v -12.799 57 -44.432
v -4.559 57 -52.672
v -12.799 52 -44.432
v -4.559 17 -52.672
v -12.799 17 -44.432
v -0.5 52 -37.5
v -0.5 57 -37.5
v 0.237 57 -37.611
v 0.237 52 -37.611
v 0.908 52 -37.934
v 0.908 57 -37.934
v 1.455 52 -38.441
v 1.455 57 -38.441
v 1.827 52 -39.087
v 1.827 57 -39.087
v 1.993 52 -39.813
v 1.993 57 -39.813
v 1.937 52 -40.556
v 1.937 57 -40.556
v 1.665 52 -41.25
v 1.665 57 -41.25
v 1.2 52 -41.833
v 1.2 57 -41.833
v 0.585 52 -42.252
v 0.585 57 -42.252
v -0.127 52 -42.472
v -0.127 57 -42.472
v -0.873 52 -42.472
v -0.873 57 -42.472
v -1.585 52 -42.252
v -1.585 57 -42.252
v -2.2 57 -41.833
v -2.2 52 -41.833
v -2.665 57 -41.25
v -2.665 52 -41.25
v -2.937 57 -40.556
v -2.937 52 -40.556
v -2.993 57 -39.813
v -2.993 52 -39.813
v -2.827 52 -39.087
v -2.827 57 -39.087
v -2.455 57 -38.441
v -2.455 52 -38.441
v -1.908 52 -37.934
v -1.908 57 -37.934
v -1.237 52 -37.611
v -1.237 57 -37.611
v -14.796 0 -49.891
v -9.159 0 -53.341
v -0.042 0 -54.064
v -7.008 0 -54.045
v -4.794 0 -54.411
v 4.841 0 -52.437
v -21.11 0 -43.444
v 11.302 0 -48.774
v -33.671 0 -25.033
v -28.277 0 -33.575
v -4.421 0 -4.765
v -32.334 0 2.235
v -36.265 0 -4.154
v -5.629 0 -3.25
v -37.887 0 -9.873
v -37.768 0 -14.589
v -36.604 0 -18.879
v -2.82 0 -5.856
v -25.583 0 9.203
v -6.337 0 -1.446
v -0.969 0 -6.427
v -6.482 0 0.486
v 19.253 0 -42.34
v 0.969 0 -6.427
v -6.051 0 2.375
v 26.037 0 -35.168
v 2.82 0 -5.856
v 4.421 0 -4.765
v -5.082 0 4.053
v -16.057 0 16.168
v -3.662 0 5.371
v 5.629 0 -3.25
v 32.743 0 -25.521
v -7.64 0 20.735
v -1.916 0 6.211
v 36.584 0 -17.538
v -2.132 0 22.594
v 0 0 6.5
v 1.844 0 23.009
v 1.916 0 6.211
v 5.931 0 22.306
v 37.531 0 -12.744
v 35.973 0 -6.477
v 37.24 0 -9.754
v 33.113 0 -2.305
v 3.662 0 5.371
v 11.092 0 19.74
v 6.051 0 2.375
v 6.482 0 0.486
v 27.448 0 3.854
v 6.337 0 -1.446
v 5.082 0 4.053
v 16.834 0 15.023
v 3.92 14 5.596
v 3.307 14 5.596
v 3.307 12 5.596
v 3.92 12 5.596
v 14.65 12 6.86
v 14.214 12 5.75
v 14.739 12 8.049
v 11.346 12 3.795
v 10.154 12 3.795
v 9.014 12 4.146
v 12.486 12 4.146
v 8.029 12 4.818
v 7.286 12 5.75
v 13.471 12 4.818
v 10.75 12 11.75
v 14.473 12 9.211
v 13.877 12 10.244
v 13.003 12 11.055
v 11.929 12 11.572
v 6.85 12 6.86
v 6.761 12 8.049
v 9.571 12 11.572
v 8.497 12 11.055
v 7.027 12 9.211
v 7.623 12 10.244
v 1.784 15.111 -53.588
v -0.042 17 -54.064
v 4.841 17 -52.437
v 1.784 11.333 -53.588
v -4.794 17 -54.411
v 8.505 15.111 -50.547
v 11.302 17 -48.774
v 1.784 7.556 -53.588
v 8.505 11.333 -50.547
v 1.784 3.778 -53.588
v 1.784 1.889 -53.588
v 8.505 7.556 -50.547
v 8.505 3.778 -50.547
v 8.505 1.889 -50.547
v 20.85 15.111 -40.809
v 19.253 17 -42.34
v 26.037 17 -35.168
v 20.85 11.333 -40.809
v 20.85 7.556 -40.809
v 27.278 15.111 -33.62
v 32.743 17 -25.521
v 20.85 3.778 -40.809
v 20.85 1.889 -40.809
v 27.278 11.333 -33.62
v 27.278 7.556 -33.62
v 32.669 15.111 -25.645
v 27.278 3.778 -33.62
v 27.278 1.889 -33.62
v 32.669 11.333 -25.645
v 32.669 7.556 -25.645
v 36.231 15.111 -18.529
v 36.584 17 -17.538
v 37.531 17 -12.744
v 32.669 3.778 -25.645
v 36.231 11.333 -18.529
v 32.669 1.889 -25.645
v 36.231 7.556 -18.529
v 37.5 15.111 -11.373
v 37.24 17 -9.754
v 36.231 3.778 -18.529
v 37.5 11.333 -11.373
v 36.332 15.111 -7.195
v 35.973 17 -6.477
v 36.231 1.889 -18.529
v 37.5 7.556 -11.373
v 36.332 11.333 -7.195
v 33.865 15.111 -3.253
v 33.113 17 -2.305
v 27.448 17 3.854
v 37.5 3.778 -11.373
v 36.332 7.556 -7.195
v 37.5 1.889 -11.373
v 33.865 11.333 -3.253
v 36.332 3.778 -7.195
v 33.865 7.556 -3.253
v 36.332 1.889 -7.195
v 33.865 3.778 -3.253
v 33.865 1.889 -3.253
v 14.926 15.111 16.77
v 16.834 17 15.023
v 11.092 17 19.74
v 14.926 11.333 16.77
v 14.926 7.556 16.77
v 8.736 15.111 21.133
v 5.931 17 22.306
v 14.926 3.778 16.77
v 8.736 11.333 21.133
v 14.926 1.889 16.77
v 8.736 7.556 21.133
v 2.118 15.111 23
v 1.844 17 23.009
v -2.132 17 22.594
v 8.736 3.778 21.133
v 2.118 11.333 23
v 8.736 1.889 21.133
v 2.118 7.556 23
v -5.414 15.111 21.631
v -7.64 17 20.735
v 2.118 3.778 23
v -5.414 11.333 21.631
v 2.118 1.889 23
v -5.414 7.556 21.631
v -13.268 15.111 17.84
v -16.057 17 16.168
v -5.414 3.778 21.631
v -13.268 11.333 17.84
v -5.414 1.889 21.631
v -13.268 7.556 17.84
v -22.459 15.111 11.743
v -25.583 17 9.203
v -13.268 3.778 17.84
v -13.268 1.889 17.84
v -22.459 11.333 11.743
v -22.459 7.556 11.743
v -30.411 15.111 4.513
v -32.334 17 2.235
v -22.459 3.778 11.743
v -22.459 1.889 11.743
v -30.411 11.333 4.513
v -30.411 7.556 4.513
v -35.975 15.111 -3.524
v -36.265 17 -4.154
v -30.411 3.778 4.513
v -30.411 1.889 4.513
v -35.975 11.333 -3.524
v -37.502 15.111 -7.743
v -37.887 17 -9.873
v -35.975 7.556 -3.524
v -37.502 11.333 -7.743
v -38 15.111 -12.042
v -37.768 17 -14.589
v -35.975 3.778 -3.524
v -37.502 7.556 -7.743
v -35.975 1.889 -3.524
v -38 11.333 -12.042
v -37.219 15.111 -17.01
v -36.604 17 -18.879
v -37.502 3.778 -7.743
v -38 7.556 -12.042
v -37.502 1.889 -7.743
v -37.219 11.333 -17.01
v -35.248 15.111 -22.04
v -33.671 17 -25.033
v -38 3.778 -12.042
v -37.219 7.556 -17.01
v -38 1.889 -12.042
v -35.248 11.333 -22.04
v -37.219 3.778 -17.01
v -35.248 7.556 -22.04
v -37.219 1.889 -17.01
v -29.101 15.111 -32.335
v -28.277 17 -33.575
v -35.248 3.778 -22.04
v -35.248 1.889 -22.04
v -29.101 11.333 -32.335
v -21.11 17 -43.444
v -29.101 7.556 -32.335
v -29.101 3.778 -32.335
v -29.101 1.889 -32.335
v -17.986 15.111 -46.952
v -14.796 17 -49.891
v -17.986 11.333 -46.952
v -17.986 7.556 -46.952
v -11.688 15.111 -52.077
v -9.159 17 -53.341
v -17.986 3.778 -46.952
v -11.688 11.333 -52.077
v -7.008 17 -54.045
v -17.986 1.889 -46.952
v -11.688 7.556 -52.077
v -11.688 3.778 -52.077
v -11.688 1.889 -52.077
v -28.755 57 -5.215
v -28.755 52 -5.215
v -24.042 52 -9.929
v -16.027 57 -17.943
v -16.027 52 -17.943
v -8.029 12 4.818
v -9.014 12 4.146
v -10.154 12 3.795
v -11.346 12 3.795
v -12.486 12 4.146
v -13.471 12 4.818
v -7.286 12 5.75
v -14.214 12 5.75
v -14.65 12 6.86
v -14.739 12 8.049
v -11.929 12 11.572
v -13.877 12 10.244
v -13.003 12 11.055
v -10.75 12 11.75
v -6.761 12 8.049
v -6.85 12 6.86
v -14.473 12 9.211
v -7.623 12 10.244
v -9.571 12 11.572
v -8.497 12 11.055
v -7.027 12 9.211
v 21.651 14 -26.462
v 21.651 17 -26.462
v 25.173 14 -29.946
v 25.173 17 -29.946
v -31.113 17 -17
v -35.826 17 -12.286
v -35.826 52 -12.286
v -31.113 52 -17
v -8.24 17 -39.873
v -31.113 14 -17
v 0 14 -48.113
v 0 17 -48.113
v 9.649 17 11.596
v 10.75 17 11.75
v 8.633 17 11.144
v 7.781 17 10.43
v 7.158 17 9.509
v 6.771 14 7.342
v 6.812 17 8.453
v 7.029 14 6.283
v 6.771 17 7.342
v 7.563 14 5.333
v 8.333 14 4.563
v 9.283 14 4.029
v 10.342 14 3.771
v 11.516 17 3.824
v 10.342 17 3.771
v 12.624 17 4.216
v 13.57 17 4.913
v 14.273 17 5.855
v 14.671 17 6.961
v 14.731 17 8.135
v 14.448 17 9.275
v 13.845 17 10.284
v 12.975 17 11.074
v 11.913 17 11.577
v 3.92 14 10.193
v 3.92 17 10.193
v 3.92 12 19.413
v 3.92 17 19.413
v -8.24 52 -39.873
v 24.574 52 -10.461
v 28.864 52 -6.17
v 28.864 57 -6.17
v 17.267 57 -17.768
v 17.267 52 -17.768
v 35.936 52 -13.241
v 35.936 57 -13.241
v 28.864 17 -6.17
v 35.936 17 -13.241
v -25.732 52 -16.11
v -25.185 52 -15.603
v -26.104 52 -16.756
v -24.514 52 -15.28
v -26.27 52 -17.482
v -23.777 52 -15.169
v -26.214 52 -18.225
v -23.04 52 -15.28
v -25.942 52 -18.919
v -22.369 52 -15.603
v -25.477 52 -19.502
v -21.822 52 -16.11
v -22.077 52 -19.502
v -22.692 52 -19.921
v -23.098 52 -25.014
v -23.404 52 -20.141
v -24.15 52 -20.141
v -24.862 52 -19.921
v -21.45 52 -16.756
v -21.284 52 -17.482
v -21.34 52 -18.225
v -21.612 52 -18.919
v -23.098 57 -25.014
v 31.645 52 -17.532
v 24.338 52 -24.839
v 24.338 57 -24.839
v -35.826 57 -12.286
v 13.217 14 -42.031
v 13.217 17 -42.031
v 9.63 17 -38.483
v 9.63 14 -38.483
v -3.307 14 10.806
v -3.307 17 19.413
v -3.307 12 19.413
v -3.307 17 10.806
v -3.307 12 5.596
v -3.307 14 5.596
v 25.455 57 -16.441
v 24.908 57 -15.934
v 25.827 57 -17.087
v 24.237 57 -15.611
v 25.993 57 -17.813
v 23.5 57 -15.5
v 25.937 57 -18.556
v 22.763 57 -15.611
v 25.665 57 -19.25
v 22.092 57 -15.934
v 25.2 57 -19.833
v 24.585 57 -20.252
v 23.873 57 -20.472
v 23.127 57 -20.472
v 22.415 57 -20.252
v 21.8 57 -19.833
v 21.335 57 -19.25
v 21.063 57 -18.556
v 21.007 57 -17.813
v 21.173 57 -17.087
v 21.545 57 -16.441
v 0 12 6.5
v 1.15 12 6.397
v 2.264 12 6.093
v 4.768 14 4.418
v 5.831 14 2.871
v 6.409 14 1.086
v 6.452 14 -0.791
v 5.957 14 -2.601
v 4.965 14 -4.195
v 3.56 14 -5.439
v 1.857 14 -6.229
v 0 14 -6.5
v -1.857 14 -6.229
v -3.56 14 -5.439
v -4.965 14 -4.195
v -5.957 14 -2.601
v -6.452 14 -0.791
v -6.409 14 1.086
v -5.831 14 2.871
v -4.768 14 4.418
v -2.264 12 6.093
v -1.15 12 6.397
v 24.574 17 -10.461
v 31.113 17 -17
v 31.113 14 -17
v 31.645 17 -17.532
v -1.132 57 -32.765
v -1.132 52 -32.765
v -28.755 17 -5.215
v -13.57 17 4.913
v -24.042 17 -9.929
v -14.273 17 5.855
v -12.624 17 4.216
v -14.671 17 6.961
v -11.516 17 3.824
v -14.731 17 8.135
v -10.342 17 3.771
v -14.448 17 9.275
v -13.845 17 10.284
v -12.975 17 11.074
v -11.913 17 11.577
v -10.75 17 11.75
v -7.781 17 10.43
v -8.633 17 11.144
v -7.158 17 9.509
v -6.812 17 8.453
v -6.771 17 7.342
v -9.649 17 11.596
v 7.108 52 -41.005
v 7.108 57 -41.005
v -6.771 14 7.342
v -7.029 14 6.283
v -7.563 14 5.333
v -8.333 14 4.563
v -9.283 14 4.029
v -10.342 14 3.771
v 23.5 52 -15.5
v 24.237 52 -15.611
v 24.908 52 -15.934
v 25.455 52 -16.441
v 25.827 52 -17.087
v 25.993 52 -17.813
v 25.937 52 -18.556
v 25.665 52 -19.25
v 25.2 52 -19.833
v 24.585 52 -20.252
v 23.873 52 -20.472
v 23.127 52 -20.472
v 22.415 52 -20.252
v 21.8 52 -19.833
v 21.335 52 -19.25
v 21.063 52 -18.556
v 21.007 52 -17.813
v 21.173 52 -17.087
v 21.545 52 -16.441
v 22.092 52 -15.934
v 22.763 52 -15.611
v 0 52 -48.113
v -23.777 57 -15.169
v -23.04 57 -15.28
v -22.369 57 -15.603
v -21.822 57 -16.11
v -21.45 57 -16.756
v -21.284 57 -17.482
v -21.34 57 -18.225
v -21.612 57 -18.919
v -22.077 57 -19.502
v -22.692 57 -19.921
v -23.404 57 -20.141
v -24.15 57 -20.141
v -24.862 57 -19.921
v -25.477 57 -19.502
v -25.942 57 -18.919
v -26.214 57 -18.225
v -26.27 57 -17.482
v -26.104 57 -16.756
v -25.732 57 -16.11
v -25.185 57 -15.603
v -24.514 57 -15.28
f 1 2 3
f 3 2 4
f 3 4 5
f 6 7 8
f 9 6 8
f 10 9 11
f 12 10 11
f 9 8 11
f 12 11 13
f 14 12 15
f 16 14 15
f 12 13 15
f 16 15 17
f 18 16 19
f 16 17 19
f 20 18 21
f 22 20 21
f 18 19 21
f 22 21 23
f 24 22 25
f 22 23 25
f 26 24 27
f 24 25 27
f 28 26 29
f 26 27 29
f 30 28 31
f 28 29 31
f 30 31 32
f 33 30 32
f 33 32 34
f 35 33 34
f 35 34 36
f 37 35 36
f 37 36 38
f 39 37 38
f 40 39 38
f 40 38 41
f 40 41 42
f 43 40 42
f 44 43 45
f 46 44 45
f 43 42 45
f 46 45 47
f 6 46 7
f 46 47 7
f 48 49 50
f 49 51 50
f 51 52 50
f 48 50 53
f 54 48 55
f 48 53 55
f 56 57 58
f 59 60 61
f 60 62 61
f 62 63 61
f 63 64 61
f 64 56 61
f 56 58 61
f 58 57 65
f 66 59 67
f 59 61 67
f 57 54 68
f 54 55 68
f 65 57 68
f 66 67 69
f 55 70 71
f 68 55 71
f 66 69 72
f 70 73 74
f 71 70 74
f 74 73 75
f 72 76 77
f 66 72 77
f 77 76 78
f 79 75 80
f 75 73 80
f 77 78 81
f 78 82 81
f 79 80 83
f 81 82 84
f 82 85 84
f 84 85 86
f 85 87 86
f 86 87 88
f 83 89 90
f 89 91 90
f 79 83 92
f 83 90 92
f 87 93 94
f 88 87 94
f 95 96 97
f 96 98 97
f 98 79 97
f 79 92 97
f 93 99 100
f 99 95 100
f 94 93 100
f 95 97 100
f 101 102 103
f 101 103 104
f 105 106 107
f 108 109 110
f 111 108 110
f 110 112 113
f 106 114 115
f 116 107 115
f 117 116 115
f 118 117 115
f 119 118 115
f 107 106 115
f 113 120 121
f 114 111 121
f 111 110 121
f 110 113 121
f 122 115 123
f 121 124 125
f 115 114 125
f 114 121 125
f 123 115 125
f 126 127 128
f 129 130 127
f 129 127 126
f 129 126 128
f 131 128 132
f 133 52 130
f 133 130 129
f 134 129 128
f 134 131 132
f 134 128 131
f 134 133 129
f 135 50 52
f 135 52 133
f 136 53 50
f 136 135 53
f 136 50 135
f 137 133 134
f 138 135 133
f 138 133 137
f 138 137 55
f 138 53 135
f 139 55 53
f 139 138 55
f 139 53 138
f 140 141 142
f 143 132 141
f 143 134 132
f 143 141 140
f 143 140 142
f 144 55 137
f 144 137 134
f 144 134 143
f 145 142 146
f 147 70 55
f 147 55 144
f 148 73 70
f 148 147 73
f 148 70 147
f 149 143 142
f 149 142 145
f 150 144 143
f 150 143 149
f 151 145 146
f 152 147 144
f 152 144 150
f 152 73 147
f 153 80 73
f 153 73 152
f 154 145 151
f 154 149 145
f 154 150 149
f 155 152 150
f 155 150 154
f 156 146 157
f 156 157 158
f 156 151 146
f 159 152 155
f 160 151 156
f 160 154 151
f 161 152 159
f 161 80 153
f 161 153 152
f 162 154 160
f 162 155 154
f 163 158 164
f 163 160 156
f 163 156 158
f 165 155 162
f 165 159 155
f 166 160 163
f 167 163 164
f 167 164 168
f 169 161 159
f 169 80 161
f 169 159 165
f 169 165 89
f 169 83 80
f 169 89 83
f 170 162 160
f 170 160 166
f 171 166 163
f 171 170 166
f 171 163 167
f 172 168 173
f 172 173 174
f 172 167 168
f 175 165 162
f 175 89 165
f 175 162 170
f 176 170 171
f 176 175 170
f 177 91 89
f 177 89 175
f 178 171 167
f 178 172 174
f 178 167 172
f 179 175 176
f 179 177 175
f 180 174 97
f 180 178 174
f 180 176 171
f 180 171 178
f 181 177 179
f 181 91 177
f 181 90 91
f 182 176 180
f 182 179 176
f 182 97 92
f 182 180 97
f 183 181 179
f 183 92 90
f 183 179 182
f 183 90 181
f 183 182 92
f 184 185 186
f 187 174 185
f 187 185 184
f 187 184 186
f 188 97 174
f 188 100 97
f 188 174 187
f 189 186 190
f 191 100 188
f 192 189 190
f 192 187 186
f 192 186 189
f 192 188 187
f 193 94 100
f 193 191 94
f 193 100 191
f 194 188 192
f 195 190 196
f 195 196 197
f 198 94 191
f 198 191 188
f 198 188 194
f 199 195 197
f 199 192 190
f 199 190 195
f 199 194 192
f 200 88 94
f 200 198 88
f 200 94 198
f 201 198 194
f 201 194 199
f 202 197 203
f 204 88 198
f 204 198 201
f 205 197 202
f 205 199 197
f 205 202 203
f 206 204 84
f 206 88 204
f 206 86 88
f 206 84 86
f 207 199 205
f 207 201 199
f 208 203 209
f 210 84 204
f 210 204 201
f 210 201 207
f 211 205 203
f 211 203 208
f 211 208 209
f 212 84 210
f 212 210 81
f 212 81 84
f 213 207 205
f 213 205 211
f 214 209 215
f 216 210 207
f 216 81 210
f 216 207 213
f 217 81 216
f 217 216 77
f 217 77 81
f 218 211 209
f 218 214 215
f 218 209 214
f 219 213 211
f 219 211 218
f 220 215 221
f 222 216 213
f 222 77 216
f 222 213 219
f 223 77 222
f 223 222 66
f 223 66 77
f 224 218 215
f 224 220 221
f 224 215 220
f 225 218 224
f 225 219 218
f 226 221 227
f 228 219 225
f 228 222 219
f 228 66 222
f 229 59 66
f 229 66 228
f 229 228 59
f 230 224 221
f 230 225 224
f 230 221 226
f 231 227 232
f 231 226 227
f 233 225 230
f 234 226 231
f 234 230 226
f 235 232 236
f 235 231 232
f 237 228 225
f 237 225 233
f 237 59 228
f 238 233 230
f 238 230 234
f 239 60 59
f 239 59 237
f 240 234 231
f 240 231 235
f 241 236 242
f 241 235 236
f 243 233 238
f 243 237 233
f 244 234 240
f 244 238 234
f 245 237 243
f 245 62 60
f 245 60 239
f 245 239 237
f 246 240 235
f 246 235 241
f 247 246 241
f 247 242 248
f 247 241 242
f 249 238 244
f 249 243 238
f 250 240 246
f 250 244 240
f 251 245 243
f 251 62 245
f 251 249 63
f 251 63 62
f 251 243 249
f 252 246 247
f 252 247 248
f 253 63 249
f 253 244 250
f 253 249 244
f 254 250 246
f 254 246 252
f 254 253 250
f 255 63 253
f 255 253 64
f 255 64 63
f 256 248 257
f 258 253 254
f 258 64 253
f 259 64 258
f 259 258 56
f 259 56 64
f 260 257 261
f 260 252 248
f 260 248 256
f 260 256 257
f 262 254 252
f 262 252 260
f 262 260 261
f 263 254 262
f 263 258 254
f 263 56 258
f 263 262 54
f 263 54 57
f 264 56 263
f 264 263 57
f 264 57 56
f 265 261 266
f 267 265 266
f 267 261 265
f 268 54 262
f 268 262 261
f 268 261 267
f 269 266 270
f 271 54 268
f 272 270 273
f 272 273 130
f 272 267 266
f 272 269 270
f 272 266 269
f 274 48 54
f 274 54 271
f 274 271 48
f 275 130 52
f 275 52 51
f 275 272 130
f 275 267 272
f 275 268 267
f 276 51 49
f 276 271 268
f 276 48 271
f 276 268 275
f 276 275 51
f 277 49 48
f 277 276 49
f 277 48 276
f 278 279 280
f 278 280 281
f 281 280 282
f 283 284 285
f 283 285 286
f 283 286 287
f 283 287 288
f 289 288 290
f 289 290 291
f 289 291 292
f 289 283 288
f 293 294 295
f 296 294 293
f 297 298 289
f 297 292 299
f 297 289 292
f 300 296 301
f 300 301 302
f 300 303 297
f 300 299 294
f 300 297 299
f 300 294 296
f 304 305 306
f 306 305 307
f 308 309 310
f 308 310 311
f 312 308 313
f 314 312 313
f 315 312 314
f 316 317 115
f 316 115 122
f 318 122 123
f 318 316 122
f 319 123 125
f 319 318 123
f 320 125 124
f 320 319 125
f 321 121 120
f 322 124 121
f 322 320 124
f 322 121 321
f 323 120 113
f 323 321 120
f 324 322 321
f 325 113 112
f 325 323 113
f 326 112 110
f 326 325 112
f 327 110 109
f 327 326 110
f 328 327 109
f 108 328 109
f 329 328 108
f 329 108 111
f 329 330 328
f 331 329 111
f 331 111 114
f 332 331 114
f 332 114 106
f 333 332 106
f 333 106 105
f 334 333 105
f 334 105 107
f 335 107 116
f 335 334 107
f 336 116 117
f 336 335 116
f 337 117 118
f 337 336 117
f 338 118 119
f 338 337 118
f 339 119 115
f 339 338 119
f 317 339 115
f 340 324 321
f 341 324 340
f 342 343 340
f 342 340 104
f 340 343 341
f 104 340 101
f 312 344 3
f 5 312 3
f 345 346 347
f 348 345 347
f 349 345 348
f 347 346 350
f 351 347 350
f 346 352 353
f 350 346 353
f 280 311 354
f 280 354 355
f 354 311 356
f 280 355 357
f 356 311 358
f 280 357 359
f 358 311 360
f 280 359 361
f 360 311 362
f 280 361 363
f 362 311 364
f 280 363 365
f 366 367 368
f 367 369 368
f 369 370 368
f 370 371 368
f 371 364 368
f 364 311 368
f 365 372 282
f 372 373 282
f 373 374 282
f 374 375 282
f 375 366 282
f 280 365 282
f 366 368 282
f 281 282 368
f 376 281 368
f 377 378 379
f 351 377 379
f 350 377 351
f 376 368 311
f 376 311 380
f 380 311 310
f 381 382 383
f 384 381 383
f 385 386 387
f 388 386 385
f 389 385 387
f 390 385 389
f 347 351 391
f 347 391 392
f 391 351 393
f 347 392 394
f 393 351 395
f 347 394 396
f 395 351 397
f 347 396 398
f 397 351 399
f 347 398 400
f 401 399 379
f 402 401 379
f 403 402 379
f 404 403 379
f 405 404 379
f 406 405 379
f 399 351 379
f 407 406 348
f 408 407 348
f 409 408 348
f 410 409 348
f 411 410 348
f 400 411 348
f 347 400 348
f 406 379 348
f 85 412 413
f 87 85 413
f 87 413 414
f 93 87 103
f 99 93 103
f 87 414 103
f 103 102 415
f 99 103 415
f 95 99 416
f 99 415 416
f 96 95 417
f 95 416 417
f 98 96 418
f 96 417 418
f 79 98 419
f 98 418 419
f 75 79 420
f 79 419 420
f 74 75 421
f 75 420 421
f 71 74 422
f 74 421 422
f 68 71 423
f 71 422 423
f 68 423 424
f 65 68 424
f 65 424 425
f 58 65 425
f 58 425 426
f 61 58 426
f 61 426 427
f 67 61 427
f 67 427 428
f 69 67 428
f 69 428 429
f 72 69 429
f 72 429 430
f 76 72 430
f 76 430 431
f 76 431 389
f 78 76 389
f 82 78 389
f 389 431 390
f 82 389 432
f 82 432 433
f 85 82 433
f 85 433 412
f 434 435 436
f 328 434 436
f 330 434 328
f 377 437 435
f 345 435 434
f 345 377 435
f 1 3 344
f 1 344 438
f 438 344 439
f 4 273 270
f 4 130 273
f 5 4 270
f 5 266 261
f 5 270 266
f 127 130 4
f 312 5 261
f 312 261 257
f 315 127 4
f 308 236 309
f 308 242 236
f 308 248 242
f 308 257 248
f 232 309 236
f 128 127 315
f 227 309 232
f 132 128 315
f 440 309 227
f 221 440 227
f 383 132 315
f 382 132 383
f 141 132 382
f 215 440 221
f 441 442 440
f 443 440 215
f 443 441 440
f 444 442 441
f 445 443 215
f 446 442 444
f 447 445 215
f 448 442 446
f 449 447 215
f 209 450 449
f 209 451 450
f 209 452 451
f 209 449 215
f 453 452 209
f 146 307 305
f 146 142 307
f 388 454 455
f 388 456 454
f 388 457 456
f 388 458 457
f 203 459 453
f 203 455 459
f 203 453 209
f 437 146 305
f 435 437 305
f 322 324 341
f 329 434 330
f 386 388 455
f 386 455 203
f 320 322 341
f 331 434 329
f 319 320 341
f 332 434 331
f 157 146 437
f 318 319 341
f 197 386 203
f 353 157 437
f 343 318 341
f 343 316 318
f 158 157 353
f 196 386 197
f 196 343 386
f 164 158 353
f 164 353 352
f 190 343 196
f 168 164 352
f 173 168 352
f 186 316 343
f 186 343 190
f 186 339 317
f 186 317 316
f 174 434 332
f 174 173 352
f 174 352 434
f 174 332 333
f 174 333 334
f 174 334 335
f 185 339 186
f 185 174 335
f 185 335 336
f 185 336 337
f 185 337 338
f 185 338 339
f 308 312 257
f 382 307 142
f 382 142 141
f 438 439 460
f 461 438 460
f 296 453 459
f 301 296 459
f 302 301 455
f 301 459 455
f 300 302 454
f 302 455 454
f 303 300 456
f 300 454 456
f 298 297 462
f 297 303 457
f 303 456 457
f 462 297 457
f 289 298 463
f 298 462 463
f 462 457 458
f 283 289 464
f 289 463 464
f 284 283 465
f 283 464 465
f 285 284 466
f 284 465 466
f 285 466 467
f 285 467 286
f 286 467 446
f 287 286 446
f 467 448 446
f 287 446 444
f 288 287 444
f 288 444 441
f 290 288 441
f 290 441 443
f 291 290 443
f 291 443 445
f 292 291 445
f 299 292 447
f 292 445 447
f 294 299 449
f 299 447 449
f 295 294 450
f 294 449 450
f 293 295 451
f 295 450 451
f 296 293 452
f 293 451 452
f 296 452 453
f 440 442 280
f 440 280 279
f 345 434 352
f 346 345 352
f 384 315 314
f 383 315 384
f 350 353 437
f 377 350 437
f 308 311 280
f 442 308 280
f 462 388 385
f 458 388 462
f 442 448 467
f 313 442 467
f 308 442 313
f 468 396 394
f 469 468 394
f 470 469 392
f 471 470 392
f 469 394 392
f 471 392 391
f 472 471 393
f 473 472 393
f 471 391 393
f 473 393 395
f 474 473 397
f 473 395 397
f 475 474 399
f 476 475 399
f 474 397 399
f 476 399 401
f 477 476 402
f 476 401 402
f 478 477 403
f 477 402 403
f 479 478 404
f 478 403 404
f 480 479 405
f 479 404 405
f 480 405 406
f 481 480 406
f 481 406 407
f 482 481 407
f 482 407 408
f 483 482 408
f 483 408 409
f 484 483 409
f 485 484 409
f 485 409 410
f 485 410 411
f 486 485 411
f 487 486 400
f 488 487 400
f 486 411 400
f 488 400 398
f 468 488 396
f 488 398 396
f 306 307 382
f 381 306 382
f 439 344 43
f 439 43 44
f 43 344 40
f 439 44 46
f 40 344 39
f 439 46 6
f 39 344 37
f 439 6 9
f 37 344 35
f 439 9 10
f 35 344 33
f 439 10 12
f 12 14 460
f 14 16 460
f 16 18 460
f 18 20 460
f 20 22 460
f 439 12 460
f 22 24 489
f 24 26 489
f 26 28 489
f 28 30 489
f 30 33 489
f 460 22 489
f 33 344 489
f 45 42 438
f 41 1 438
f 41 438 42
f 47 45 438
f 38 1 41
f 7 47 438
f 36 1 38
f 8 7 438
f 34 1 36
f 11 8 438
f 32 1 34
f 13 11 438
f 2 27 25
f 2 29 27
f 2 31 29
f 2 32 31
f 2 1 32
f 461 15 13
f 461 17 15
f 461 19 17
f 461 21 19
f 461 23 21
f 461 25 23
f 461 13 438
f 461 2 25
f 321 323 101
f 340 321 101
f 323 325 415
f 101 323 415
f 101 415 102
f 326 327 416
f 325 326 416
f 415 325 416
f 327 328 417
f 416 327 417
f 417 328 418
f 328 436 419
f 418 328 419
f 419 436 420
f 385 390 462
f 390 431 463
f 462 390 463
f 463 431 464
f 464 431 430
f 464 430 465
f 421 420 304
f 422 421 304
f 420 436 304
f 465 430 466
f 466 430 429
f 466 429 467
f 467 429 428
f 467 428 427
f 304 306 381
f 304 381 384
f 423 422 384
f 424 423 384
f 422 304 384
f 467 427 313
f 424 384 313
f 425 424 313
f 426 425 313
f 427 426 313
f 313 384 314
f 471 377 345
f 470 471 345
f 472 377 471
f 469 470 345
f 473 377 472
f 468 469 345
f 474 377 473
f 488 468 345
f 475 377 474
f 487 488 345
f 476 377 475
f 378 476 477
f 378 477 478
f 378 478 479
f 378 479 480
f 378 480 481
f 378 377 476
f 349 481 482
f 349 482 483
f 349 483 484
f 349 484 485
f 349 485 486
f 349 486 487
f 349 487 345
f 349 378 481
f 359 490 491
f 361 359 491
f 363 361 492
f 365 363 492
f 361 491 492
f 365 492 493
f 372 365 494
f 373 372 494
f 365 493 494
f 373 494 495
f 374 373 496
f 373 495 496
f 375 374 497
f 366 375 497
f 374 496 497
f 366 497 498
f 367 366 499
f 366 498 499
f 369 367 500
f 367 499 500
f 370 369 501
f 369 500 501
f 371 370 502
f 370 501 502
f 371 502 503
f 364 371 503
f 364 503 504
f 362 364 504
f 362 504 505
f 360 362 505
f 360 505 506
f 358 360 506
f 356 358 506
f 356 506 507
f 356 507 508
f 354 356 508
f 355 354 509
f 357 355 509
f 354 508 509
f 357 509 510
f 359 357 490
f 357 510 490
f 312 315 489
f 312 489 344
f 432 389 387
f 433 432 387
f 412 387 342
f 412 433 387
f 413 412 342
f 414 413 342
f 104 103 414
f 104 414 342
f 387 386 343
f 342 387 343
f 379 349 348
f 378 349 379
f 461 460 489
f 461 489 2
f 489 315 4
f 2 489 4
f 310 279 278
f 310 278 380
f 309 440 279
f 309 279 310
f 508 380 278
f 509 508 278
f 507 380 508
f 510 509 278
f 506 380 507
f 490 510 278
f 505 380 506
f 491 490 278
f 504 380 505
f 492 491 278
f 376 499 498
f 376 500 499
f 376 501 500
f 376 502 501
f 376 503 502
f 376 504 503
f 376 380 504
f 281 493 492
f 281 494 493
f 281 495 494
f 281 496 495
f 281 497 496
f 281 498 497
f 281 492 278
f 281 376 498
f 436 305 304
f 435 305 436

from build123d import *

# Parameters (mm, degrees)
SKETCH2_R           = 60
BOSS_EXTRUDE1_DEPTH = 17
SKETCH4_R           = 6.5
CUT_EXTRUDE1_DEPTH  = 17
SKETCH7_R           = 4
CUT_EXTRUDE2_DEPTH  = 5
SKETCH8_W           = 7.226657057
SKETCH8_H           = 13.816897518
CUT_EXTRUDE3_DEPTH  = 5
CUT_EXTRUDE4_DEPTH  = 3
CUT_EXTRUDE5_DEPTH  = 3
BOSS_EXTRUDE2_DEPTH = 35
BOSS_EXTRUDE3_DEPTH = 5
SKETCH13_R          = 2.5
CUT_EXTRUDE7_DEPTH  = 5
SKETCH15_R          = 2.5
CUT_EXTRUDE8_DEPTH  = 5
SKETCH14_R          = 2.5
CUT_EXTRUDE9_DEPTH  = 5
CUT_EXTRUDE10_START = -17
SKETCH16_R          = 60
CUT_EXTRUDE10_DEPTH = 17


with BuildPart() as part:
    # Sketch2 → Boss-Extrude1 (new body)
    with BuildSketch(Plane(origin=(0, 0, 0), x_dir=(1, 0, 0), z_dir=(0, 1, 0))):
        with Locations(Location((0, 0, 0), (0, 0, 270))):
            Circle(SKETCH2_R)
    extrude(amount=BOSS_EXTRUDE1_DEPTH)

    # Sketch4 → Cut-Extrude1 (cut)
    with BuildSketch(Plane(origin=(0, 17, 0), x_dir=(1, 0, 0), z_dir=(0, 1, 0))):
        with Locations(Location((0, 0, 0), (0, 0, 270))):
            Circle(SKETCH4_R)
    extrude(amount=-CUT_EXTRUDE1_DEPTH, mode=Mode.SUBTRACT)

    # Sketch7 → Cut-Extrude2 (cut)
    with BuildSketch(Plane(origin=(0, 17, 0), x_dir=(1, 0, 0), z_dir=(0, 1, 0))):
        with Locations(Location((-10.75, -7.75, 0), (0, 0, 270))):
            Circle(SKETCH7_R)
    cut_extrude2 = extrude(amount=-CUT_EXTRUDE2_DEPTH, mode=Mode.SUBTRACT)

    # Mirror1: Cut-Extrude2 across plane
    add(cut_extrude2.mirror(Plane(origin=(0, 0, 0), x_dir=(0, 0, 1), z_dir=(1, 0, 0))), mode=Mode.SUBTRACT)

    # Sketch8 → Cut-Extrude3 (cut)
    with BuildSketch(Plane(origin=(0, 17, 0), x_dir=(1, 0, 0), z_dir=(0, 1, 0))):
        with Locations((0.306588, -12.504471192)):
            Rectangle(SKETCH8_W, SKETCH8_H)
    extrude(amount=-CUT_EXTRUDE3_DEPTH, mode=Mode.SUBTRACT)

    # Sketch9 → Cut-Extrude4 (cut)
    with BuildSketch(Plane(origin=(0, 17, 0), x_dir=(1, 0, 0), z_dir=(0, 1, 0))):
        Polygon((-31.112706744, 17), (-8.372e-06, 48.112698372), (31.11269, 17), (-8.372e-06, -14.112698372), align=None)
    extrude(amount=-CUT_EXTRUDE4_DEPTH, mode=Mode.SUBTRACT)

    # Sketch6 → Cut-Extrude5 (cut)
    with BuildSketch(Plane(origin=(0, 17, 0), x_dir=(1, 0, 0), z_dir=(0, 1, 0))):
        Polygon((-5.977874391, 23.042765738), (5.977874391, 10.957234262), (25.17254203, 29.945776443), (13.216793249, 42.03130792), align=None)
    extrude(amount=-CUT_EXTRUDE5_DEPTH, mode=Mode.SUBTRACT)

    # Sketch11 → Boss-Extrude2 (add)
    with BuildSketch(Plane(origin=(0, 17, 0), x_dir=(1, 0, 0), z_dir=(0, 1, 0))):
        Polygon((-8.372e-06, 48.112698372), (-8.240017503, 39.872689242), (-12.799306685, 44.431978425), (-4.559297555, 52.671987555), align=None)
        Polygon((-31.112706744, 17), (-24.041638933, 9.928932188), (-28.755220541, 5.21535058), (-35.826288353, 12.286418392), align=None)
        Polygon((31.644591703, 17.531901703), (24.573523891, 10.460833891), (28.864455193, 6.169902588), (35.935523005, 13.2409704), align=None)
    extrude(amount=BOSS_EXTRUDE2_DEPTH)

    # Sketch12 → Boss-Extrude3 (add)
    with BuildSketch(Plane(origin=(0, 52, 0), x_dir=(1, 0, 0), z_dir=(0, 1, 0))):
        Polygon((-4.559297555, 52.671987555), (-12.799306685, 44.431978425), (-1.132044796, 32.764716535), (7.107964335, 41.004725665), align=None)
        Polygon((-35.826288353, 12.286418392), (-28.755220541, 5.21535058), (-16.027298479, 17.943272641), (-23.098366291, 25.014340453), align=None)
        Polygon((35.935523005, 13.2409704), (28.864455193, 6.169902588), (17.266701717, 17.767656064), (24.337769529, 24.838723876), align=None)
    extrude(amount=BOSS_EXTRUDE3_DEPTH)

    # Sketch13 → Cut-Extrude7 (cut)
    with BuildSketch(Plane(origin=(0, 57, 0), x_dir=(1, 0, 0), z_dir=(0, 1, 0))):
        with Locations(Location((-0.5, 40, 0), (0, 0, 270))):
            Circle(SKETCH13_R)
    extrude(amount=-CUT_EXTRUDE7_DEPTH, mode=Mode.SUBTRACT)

    # Sketch15 → Cut-Extrude8 (cut)
    with BuildSketch(Plane(origin=(0, 57, 0), x_dir=(1, 0, 0), z_dir=(0, 1, 0))):
        with Locations(Location((-23.777002133, 17.668993601, 0), (0, 0, 270))):
            Circle(SKETCH15_R)
    extrude(amount=-CUT_EXTRUDE8_DEPTH, mode=Mode.SUBTRACT)

    # Sketch14 → Cut-Extrude9 (cut)
    with BuildSketch(Plane(origin=(0, 57, 0), x_dir=(1, 0, 0), z_dir=(0, 1, 0))):
        with Locations(Location((23.5, 18, 0), (0, 0, 270))):
            Circle(SKETCH14_R)
    extrude(amount=-CUT_EXTRUDE9_DEPTH, mode=Mode.SUBTRACT)

    # Sketch16 → Cut-Extrude10 (cut)
    with BuildSketch(Plane(origin=(0, 17, 0), x_dir=(1, 0, 0), z_dir=(0, 1, 0)).offset(CUT_EXTRUDE10_START)):
        Circle(SKETCH16_R)
        with BuildLine():
            add(Edge.make_bspline(
                [(-4.79445414, 54.411479542), (3.711953261, 55.123778385), (20.176812176, 43.163893552), (32.095851639, 27.739664068), (41.103501035, 9.384731909), (23.441378071, -7.012281145), (7.387216057, -27.669539214), (-20.675561177, -15.265601832), (-45.215914175, 6.863059518), (-27.534475147, 35.312307502), (-14.416385352, 53.60577037), (-4.79445414, 54.411479542)],
                knots=[0, 0, 0, 0, 0.129983166, 0.216069769, 0.283536175, 0.368923683, 0.507401419, 0.580069943, 0.753753629, 0.852970941, 1, 1, 1, 1], degree=3))
        make_face(mode=Mode.SUBTRACT)
    extrude(amount=CUT_EXTRUDE10_DEPTH, mode=Mode.SUBTRACT)


solid = part.part
